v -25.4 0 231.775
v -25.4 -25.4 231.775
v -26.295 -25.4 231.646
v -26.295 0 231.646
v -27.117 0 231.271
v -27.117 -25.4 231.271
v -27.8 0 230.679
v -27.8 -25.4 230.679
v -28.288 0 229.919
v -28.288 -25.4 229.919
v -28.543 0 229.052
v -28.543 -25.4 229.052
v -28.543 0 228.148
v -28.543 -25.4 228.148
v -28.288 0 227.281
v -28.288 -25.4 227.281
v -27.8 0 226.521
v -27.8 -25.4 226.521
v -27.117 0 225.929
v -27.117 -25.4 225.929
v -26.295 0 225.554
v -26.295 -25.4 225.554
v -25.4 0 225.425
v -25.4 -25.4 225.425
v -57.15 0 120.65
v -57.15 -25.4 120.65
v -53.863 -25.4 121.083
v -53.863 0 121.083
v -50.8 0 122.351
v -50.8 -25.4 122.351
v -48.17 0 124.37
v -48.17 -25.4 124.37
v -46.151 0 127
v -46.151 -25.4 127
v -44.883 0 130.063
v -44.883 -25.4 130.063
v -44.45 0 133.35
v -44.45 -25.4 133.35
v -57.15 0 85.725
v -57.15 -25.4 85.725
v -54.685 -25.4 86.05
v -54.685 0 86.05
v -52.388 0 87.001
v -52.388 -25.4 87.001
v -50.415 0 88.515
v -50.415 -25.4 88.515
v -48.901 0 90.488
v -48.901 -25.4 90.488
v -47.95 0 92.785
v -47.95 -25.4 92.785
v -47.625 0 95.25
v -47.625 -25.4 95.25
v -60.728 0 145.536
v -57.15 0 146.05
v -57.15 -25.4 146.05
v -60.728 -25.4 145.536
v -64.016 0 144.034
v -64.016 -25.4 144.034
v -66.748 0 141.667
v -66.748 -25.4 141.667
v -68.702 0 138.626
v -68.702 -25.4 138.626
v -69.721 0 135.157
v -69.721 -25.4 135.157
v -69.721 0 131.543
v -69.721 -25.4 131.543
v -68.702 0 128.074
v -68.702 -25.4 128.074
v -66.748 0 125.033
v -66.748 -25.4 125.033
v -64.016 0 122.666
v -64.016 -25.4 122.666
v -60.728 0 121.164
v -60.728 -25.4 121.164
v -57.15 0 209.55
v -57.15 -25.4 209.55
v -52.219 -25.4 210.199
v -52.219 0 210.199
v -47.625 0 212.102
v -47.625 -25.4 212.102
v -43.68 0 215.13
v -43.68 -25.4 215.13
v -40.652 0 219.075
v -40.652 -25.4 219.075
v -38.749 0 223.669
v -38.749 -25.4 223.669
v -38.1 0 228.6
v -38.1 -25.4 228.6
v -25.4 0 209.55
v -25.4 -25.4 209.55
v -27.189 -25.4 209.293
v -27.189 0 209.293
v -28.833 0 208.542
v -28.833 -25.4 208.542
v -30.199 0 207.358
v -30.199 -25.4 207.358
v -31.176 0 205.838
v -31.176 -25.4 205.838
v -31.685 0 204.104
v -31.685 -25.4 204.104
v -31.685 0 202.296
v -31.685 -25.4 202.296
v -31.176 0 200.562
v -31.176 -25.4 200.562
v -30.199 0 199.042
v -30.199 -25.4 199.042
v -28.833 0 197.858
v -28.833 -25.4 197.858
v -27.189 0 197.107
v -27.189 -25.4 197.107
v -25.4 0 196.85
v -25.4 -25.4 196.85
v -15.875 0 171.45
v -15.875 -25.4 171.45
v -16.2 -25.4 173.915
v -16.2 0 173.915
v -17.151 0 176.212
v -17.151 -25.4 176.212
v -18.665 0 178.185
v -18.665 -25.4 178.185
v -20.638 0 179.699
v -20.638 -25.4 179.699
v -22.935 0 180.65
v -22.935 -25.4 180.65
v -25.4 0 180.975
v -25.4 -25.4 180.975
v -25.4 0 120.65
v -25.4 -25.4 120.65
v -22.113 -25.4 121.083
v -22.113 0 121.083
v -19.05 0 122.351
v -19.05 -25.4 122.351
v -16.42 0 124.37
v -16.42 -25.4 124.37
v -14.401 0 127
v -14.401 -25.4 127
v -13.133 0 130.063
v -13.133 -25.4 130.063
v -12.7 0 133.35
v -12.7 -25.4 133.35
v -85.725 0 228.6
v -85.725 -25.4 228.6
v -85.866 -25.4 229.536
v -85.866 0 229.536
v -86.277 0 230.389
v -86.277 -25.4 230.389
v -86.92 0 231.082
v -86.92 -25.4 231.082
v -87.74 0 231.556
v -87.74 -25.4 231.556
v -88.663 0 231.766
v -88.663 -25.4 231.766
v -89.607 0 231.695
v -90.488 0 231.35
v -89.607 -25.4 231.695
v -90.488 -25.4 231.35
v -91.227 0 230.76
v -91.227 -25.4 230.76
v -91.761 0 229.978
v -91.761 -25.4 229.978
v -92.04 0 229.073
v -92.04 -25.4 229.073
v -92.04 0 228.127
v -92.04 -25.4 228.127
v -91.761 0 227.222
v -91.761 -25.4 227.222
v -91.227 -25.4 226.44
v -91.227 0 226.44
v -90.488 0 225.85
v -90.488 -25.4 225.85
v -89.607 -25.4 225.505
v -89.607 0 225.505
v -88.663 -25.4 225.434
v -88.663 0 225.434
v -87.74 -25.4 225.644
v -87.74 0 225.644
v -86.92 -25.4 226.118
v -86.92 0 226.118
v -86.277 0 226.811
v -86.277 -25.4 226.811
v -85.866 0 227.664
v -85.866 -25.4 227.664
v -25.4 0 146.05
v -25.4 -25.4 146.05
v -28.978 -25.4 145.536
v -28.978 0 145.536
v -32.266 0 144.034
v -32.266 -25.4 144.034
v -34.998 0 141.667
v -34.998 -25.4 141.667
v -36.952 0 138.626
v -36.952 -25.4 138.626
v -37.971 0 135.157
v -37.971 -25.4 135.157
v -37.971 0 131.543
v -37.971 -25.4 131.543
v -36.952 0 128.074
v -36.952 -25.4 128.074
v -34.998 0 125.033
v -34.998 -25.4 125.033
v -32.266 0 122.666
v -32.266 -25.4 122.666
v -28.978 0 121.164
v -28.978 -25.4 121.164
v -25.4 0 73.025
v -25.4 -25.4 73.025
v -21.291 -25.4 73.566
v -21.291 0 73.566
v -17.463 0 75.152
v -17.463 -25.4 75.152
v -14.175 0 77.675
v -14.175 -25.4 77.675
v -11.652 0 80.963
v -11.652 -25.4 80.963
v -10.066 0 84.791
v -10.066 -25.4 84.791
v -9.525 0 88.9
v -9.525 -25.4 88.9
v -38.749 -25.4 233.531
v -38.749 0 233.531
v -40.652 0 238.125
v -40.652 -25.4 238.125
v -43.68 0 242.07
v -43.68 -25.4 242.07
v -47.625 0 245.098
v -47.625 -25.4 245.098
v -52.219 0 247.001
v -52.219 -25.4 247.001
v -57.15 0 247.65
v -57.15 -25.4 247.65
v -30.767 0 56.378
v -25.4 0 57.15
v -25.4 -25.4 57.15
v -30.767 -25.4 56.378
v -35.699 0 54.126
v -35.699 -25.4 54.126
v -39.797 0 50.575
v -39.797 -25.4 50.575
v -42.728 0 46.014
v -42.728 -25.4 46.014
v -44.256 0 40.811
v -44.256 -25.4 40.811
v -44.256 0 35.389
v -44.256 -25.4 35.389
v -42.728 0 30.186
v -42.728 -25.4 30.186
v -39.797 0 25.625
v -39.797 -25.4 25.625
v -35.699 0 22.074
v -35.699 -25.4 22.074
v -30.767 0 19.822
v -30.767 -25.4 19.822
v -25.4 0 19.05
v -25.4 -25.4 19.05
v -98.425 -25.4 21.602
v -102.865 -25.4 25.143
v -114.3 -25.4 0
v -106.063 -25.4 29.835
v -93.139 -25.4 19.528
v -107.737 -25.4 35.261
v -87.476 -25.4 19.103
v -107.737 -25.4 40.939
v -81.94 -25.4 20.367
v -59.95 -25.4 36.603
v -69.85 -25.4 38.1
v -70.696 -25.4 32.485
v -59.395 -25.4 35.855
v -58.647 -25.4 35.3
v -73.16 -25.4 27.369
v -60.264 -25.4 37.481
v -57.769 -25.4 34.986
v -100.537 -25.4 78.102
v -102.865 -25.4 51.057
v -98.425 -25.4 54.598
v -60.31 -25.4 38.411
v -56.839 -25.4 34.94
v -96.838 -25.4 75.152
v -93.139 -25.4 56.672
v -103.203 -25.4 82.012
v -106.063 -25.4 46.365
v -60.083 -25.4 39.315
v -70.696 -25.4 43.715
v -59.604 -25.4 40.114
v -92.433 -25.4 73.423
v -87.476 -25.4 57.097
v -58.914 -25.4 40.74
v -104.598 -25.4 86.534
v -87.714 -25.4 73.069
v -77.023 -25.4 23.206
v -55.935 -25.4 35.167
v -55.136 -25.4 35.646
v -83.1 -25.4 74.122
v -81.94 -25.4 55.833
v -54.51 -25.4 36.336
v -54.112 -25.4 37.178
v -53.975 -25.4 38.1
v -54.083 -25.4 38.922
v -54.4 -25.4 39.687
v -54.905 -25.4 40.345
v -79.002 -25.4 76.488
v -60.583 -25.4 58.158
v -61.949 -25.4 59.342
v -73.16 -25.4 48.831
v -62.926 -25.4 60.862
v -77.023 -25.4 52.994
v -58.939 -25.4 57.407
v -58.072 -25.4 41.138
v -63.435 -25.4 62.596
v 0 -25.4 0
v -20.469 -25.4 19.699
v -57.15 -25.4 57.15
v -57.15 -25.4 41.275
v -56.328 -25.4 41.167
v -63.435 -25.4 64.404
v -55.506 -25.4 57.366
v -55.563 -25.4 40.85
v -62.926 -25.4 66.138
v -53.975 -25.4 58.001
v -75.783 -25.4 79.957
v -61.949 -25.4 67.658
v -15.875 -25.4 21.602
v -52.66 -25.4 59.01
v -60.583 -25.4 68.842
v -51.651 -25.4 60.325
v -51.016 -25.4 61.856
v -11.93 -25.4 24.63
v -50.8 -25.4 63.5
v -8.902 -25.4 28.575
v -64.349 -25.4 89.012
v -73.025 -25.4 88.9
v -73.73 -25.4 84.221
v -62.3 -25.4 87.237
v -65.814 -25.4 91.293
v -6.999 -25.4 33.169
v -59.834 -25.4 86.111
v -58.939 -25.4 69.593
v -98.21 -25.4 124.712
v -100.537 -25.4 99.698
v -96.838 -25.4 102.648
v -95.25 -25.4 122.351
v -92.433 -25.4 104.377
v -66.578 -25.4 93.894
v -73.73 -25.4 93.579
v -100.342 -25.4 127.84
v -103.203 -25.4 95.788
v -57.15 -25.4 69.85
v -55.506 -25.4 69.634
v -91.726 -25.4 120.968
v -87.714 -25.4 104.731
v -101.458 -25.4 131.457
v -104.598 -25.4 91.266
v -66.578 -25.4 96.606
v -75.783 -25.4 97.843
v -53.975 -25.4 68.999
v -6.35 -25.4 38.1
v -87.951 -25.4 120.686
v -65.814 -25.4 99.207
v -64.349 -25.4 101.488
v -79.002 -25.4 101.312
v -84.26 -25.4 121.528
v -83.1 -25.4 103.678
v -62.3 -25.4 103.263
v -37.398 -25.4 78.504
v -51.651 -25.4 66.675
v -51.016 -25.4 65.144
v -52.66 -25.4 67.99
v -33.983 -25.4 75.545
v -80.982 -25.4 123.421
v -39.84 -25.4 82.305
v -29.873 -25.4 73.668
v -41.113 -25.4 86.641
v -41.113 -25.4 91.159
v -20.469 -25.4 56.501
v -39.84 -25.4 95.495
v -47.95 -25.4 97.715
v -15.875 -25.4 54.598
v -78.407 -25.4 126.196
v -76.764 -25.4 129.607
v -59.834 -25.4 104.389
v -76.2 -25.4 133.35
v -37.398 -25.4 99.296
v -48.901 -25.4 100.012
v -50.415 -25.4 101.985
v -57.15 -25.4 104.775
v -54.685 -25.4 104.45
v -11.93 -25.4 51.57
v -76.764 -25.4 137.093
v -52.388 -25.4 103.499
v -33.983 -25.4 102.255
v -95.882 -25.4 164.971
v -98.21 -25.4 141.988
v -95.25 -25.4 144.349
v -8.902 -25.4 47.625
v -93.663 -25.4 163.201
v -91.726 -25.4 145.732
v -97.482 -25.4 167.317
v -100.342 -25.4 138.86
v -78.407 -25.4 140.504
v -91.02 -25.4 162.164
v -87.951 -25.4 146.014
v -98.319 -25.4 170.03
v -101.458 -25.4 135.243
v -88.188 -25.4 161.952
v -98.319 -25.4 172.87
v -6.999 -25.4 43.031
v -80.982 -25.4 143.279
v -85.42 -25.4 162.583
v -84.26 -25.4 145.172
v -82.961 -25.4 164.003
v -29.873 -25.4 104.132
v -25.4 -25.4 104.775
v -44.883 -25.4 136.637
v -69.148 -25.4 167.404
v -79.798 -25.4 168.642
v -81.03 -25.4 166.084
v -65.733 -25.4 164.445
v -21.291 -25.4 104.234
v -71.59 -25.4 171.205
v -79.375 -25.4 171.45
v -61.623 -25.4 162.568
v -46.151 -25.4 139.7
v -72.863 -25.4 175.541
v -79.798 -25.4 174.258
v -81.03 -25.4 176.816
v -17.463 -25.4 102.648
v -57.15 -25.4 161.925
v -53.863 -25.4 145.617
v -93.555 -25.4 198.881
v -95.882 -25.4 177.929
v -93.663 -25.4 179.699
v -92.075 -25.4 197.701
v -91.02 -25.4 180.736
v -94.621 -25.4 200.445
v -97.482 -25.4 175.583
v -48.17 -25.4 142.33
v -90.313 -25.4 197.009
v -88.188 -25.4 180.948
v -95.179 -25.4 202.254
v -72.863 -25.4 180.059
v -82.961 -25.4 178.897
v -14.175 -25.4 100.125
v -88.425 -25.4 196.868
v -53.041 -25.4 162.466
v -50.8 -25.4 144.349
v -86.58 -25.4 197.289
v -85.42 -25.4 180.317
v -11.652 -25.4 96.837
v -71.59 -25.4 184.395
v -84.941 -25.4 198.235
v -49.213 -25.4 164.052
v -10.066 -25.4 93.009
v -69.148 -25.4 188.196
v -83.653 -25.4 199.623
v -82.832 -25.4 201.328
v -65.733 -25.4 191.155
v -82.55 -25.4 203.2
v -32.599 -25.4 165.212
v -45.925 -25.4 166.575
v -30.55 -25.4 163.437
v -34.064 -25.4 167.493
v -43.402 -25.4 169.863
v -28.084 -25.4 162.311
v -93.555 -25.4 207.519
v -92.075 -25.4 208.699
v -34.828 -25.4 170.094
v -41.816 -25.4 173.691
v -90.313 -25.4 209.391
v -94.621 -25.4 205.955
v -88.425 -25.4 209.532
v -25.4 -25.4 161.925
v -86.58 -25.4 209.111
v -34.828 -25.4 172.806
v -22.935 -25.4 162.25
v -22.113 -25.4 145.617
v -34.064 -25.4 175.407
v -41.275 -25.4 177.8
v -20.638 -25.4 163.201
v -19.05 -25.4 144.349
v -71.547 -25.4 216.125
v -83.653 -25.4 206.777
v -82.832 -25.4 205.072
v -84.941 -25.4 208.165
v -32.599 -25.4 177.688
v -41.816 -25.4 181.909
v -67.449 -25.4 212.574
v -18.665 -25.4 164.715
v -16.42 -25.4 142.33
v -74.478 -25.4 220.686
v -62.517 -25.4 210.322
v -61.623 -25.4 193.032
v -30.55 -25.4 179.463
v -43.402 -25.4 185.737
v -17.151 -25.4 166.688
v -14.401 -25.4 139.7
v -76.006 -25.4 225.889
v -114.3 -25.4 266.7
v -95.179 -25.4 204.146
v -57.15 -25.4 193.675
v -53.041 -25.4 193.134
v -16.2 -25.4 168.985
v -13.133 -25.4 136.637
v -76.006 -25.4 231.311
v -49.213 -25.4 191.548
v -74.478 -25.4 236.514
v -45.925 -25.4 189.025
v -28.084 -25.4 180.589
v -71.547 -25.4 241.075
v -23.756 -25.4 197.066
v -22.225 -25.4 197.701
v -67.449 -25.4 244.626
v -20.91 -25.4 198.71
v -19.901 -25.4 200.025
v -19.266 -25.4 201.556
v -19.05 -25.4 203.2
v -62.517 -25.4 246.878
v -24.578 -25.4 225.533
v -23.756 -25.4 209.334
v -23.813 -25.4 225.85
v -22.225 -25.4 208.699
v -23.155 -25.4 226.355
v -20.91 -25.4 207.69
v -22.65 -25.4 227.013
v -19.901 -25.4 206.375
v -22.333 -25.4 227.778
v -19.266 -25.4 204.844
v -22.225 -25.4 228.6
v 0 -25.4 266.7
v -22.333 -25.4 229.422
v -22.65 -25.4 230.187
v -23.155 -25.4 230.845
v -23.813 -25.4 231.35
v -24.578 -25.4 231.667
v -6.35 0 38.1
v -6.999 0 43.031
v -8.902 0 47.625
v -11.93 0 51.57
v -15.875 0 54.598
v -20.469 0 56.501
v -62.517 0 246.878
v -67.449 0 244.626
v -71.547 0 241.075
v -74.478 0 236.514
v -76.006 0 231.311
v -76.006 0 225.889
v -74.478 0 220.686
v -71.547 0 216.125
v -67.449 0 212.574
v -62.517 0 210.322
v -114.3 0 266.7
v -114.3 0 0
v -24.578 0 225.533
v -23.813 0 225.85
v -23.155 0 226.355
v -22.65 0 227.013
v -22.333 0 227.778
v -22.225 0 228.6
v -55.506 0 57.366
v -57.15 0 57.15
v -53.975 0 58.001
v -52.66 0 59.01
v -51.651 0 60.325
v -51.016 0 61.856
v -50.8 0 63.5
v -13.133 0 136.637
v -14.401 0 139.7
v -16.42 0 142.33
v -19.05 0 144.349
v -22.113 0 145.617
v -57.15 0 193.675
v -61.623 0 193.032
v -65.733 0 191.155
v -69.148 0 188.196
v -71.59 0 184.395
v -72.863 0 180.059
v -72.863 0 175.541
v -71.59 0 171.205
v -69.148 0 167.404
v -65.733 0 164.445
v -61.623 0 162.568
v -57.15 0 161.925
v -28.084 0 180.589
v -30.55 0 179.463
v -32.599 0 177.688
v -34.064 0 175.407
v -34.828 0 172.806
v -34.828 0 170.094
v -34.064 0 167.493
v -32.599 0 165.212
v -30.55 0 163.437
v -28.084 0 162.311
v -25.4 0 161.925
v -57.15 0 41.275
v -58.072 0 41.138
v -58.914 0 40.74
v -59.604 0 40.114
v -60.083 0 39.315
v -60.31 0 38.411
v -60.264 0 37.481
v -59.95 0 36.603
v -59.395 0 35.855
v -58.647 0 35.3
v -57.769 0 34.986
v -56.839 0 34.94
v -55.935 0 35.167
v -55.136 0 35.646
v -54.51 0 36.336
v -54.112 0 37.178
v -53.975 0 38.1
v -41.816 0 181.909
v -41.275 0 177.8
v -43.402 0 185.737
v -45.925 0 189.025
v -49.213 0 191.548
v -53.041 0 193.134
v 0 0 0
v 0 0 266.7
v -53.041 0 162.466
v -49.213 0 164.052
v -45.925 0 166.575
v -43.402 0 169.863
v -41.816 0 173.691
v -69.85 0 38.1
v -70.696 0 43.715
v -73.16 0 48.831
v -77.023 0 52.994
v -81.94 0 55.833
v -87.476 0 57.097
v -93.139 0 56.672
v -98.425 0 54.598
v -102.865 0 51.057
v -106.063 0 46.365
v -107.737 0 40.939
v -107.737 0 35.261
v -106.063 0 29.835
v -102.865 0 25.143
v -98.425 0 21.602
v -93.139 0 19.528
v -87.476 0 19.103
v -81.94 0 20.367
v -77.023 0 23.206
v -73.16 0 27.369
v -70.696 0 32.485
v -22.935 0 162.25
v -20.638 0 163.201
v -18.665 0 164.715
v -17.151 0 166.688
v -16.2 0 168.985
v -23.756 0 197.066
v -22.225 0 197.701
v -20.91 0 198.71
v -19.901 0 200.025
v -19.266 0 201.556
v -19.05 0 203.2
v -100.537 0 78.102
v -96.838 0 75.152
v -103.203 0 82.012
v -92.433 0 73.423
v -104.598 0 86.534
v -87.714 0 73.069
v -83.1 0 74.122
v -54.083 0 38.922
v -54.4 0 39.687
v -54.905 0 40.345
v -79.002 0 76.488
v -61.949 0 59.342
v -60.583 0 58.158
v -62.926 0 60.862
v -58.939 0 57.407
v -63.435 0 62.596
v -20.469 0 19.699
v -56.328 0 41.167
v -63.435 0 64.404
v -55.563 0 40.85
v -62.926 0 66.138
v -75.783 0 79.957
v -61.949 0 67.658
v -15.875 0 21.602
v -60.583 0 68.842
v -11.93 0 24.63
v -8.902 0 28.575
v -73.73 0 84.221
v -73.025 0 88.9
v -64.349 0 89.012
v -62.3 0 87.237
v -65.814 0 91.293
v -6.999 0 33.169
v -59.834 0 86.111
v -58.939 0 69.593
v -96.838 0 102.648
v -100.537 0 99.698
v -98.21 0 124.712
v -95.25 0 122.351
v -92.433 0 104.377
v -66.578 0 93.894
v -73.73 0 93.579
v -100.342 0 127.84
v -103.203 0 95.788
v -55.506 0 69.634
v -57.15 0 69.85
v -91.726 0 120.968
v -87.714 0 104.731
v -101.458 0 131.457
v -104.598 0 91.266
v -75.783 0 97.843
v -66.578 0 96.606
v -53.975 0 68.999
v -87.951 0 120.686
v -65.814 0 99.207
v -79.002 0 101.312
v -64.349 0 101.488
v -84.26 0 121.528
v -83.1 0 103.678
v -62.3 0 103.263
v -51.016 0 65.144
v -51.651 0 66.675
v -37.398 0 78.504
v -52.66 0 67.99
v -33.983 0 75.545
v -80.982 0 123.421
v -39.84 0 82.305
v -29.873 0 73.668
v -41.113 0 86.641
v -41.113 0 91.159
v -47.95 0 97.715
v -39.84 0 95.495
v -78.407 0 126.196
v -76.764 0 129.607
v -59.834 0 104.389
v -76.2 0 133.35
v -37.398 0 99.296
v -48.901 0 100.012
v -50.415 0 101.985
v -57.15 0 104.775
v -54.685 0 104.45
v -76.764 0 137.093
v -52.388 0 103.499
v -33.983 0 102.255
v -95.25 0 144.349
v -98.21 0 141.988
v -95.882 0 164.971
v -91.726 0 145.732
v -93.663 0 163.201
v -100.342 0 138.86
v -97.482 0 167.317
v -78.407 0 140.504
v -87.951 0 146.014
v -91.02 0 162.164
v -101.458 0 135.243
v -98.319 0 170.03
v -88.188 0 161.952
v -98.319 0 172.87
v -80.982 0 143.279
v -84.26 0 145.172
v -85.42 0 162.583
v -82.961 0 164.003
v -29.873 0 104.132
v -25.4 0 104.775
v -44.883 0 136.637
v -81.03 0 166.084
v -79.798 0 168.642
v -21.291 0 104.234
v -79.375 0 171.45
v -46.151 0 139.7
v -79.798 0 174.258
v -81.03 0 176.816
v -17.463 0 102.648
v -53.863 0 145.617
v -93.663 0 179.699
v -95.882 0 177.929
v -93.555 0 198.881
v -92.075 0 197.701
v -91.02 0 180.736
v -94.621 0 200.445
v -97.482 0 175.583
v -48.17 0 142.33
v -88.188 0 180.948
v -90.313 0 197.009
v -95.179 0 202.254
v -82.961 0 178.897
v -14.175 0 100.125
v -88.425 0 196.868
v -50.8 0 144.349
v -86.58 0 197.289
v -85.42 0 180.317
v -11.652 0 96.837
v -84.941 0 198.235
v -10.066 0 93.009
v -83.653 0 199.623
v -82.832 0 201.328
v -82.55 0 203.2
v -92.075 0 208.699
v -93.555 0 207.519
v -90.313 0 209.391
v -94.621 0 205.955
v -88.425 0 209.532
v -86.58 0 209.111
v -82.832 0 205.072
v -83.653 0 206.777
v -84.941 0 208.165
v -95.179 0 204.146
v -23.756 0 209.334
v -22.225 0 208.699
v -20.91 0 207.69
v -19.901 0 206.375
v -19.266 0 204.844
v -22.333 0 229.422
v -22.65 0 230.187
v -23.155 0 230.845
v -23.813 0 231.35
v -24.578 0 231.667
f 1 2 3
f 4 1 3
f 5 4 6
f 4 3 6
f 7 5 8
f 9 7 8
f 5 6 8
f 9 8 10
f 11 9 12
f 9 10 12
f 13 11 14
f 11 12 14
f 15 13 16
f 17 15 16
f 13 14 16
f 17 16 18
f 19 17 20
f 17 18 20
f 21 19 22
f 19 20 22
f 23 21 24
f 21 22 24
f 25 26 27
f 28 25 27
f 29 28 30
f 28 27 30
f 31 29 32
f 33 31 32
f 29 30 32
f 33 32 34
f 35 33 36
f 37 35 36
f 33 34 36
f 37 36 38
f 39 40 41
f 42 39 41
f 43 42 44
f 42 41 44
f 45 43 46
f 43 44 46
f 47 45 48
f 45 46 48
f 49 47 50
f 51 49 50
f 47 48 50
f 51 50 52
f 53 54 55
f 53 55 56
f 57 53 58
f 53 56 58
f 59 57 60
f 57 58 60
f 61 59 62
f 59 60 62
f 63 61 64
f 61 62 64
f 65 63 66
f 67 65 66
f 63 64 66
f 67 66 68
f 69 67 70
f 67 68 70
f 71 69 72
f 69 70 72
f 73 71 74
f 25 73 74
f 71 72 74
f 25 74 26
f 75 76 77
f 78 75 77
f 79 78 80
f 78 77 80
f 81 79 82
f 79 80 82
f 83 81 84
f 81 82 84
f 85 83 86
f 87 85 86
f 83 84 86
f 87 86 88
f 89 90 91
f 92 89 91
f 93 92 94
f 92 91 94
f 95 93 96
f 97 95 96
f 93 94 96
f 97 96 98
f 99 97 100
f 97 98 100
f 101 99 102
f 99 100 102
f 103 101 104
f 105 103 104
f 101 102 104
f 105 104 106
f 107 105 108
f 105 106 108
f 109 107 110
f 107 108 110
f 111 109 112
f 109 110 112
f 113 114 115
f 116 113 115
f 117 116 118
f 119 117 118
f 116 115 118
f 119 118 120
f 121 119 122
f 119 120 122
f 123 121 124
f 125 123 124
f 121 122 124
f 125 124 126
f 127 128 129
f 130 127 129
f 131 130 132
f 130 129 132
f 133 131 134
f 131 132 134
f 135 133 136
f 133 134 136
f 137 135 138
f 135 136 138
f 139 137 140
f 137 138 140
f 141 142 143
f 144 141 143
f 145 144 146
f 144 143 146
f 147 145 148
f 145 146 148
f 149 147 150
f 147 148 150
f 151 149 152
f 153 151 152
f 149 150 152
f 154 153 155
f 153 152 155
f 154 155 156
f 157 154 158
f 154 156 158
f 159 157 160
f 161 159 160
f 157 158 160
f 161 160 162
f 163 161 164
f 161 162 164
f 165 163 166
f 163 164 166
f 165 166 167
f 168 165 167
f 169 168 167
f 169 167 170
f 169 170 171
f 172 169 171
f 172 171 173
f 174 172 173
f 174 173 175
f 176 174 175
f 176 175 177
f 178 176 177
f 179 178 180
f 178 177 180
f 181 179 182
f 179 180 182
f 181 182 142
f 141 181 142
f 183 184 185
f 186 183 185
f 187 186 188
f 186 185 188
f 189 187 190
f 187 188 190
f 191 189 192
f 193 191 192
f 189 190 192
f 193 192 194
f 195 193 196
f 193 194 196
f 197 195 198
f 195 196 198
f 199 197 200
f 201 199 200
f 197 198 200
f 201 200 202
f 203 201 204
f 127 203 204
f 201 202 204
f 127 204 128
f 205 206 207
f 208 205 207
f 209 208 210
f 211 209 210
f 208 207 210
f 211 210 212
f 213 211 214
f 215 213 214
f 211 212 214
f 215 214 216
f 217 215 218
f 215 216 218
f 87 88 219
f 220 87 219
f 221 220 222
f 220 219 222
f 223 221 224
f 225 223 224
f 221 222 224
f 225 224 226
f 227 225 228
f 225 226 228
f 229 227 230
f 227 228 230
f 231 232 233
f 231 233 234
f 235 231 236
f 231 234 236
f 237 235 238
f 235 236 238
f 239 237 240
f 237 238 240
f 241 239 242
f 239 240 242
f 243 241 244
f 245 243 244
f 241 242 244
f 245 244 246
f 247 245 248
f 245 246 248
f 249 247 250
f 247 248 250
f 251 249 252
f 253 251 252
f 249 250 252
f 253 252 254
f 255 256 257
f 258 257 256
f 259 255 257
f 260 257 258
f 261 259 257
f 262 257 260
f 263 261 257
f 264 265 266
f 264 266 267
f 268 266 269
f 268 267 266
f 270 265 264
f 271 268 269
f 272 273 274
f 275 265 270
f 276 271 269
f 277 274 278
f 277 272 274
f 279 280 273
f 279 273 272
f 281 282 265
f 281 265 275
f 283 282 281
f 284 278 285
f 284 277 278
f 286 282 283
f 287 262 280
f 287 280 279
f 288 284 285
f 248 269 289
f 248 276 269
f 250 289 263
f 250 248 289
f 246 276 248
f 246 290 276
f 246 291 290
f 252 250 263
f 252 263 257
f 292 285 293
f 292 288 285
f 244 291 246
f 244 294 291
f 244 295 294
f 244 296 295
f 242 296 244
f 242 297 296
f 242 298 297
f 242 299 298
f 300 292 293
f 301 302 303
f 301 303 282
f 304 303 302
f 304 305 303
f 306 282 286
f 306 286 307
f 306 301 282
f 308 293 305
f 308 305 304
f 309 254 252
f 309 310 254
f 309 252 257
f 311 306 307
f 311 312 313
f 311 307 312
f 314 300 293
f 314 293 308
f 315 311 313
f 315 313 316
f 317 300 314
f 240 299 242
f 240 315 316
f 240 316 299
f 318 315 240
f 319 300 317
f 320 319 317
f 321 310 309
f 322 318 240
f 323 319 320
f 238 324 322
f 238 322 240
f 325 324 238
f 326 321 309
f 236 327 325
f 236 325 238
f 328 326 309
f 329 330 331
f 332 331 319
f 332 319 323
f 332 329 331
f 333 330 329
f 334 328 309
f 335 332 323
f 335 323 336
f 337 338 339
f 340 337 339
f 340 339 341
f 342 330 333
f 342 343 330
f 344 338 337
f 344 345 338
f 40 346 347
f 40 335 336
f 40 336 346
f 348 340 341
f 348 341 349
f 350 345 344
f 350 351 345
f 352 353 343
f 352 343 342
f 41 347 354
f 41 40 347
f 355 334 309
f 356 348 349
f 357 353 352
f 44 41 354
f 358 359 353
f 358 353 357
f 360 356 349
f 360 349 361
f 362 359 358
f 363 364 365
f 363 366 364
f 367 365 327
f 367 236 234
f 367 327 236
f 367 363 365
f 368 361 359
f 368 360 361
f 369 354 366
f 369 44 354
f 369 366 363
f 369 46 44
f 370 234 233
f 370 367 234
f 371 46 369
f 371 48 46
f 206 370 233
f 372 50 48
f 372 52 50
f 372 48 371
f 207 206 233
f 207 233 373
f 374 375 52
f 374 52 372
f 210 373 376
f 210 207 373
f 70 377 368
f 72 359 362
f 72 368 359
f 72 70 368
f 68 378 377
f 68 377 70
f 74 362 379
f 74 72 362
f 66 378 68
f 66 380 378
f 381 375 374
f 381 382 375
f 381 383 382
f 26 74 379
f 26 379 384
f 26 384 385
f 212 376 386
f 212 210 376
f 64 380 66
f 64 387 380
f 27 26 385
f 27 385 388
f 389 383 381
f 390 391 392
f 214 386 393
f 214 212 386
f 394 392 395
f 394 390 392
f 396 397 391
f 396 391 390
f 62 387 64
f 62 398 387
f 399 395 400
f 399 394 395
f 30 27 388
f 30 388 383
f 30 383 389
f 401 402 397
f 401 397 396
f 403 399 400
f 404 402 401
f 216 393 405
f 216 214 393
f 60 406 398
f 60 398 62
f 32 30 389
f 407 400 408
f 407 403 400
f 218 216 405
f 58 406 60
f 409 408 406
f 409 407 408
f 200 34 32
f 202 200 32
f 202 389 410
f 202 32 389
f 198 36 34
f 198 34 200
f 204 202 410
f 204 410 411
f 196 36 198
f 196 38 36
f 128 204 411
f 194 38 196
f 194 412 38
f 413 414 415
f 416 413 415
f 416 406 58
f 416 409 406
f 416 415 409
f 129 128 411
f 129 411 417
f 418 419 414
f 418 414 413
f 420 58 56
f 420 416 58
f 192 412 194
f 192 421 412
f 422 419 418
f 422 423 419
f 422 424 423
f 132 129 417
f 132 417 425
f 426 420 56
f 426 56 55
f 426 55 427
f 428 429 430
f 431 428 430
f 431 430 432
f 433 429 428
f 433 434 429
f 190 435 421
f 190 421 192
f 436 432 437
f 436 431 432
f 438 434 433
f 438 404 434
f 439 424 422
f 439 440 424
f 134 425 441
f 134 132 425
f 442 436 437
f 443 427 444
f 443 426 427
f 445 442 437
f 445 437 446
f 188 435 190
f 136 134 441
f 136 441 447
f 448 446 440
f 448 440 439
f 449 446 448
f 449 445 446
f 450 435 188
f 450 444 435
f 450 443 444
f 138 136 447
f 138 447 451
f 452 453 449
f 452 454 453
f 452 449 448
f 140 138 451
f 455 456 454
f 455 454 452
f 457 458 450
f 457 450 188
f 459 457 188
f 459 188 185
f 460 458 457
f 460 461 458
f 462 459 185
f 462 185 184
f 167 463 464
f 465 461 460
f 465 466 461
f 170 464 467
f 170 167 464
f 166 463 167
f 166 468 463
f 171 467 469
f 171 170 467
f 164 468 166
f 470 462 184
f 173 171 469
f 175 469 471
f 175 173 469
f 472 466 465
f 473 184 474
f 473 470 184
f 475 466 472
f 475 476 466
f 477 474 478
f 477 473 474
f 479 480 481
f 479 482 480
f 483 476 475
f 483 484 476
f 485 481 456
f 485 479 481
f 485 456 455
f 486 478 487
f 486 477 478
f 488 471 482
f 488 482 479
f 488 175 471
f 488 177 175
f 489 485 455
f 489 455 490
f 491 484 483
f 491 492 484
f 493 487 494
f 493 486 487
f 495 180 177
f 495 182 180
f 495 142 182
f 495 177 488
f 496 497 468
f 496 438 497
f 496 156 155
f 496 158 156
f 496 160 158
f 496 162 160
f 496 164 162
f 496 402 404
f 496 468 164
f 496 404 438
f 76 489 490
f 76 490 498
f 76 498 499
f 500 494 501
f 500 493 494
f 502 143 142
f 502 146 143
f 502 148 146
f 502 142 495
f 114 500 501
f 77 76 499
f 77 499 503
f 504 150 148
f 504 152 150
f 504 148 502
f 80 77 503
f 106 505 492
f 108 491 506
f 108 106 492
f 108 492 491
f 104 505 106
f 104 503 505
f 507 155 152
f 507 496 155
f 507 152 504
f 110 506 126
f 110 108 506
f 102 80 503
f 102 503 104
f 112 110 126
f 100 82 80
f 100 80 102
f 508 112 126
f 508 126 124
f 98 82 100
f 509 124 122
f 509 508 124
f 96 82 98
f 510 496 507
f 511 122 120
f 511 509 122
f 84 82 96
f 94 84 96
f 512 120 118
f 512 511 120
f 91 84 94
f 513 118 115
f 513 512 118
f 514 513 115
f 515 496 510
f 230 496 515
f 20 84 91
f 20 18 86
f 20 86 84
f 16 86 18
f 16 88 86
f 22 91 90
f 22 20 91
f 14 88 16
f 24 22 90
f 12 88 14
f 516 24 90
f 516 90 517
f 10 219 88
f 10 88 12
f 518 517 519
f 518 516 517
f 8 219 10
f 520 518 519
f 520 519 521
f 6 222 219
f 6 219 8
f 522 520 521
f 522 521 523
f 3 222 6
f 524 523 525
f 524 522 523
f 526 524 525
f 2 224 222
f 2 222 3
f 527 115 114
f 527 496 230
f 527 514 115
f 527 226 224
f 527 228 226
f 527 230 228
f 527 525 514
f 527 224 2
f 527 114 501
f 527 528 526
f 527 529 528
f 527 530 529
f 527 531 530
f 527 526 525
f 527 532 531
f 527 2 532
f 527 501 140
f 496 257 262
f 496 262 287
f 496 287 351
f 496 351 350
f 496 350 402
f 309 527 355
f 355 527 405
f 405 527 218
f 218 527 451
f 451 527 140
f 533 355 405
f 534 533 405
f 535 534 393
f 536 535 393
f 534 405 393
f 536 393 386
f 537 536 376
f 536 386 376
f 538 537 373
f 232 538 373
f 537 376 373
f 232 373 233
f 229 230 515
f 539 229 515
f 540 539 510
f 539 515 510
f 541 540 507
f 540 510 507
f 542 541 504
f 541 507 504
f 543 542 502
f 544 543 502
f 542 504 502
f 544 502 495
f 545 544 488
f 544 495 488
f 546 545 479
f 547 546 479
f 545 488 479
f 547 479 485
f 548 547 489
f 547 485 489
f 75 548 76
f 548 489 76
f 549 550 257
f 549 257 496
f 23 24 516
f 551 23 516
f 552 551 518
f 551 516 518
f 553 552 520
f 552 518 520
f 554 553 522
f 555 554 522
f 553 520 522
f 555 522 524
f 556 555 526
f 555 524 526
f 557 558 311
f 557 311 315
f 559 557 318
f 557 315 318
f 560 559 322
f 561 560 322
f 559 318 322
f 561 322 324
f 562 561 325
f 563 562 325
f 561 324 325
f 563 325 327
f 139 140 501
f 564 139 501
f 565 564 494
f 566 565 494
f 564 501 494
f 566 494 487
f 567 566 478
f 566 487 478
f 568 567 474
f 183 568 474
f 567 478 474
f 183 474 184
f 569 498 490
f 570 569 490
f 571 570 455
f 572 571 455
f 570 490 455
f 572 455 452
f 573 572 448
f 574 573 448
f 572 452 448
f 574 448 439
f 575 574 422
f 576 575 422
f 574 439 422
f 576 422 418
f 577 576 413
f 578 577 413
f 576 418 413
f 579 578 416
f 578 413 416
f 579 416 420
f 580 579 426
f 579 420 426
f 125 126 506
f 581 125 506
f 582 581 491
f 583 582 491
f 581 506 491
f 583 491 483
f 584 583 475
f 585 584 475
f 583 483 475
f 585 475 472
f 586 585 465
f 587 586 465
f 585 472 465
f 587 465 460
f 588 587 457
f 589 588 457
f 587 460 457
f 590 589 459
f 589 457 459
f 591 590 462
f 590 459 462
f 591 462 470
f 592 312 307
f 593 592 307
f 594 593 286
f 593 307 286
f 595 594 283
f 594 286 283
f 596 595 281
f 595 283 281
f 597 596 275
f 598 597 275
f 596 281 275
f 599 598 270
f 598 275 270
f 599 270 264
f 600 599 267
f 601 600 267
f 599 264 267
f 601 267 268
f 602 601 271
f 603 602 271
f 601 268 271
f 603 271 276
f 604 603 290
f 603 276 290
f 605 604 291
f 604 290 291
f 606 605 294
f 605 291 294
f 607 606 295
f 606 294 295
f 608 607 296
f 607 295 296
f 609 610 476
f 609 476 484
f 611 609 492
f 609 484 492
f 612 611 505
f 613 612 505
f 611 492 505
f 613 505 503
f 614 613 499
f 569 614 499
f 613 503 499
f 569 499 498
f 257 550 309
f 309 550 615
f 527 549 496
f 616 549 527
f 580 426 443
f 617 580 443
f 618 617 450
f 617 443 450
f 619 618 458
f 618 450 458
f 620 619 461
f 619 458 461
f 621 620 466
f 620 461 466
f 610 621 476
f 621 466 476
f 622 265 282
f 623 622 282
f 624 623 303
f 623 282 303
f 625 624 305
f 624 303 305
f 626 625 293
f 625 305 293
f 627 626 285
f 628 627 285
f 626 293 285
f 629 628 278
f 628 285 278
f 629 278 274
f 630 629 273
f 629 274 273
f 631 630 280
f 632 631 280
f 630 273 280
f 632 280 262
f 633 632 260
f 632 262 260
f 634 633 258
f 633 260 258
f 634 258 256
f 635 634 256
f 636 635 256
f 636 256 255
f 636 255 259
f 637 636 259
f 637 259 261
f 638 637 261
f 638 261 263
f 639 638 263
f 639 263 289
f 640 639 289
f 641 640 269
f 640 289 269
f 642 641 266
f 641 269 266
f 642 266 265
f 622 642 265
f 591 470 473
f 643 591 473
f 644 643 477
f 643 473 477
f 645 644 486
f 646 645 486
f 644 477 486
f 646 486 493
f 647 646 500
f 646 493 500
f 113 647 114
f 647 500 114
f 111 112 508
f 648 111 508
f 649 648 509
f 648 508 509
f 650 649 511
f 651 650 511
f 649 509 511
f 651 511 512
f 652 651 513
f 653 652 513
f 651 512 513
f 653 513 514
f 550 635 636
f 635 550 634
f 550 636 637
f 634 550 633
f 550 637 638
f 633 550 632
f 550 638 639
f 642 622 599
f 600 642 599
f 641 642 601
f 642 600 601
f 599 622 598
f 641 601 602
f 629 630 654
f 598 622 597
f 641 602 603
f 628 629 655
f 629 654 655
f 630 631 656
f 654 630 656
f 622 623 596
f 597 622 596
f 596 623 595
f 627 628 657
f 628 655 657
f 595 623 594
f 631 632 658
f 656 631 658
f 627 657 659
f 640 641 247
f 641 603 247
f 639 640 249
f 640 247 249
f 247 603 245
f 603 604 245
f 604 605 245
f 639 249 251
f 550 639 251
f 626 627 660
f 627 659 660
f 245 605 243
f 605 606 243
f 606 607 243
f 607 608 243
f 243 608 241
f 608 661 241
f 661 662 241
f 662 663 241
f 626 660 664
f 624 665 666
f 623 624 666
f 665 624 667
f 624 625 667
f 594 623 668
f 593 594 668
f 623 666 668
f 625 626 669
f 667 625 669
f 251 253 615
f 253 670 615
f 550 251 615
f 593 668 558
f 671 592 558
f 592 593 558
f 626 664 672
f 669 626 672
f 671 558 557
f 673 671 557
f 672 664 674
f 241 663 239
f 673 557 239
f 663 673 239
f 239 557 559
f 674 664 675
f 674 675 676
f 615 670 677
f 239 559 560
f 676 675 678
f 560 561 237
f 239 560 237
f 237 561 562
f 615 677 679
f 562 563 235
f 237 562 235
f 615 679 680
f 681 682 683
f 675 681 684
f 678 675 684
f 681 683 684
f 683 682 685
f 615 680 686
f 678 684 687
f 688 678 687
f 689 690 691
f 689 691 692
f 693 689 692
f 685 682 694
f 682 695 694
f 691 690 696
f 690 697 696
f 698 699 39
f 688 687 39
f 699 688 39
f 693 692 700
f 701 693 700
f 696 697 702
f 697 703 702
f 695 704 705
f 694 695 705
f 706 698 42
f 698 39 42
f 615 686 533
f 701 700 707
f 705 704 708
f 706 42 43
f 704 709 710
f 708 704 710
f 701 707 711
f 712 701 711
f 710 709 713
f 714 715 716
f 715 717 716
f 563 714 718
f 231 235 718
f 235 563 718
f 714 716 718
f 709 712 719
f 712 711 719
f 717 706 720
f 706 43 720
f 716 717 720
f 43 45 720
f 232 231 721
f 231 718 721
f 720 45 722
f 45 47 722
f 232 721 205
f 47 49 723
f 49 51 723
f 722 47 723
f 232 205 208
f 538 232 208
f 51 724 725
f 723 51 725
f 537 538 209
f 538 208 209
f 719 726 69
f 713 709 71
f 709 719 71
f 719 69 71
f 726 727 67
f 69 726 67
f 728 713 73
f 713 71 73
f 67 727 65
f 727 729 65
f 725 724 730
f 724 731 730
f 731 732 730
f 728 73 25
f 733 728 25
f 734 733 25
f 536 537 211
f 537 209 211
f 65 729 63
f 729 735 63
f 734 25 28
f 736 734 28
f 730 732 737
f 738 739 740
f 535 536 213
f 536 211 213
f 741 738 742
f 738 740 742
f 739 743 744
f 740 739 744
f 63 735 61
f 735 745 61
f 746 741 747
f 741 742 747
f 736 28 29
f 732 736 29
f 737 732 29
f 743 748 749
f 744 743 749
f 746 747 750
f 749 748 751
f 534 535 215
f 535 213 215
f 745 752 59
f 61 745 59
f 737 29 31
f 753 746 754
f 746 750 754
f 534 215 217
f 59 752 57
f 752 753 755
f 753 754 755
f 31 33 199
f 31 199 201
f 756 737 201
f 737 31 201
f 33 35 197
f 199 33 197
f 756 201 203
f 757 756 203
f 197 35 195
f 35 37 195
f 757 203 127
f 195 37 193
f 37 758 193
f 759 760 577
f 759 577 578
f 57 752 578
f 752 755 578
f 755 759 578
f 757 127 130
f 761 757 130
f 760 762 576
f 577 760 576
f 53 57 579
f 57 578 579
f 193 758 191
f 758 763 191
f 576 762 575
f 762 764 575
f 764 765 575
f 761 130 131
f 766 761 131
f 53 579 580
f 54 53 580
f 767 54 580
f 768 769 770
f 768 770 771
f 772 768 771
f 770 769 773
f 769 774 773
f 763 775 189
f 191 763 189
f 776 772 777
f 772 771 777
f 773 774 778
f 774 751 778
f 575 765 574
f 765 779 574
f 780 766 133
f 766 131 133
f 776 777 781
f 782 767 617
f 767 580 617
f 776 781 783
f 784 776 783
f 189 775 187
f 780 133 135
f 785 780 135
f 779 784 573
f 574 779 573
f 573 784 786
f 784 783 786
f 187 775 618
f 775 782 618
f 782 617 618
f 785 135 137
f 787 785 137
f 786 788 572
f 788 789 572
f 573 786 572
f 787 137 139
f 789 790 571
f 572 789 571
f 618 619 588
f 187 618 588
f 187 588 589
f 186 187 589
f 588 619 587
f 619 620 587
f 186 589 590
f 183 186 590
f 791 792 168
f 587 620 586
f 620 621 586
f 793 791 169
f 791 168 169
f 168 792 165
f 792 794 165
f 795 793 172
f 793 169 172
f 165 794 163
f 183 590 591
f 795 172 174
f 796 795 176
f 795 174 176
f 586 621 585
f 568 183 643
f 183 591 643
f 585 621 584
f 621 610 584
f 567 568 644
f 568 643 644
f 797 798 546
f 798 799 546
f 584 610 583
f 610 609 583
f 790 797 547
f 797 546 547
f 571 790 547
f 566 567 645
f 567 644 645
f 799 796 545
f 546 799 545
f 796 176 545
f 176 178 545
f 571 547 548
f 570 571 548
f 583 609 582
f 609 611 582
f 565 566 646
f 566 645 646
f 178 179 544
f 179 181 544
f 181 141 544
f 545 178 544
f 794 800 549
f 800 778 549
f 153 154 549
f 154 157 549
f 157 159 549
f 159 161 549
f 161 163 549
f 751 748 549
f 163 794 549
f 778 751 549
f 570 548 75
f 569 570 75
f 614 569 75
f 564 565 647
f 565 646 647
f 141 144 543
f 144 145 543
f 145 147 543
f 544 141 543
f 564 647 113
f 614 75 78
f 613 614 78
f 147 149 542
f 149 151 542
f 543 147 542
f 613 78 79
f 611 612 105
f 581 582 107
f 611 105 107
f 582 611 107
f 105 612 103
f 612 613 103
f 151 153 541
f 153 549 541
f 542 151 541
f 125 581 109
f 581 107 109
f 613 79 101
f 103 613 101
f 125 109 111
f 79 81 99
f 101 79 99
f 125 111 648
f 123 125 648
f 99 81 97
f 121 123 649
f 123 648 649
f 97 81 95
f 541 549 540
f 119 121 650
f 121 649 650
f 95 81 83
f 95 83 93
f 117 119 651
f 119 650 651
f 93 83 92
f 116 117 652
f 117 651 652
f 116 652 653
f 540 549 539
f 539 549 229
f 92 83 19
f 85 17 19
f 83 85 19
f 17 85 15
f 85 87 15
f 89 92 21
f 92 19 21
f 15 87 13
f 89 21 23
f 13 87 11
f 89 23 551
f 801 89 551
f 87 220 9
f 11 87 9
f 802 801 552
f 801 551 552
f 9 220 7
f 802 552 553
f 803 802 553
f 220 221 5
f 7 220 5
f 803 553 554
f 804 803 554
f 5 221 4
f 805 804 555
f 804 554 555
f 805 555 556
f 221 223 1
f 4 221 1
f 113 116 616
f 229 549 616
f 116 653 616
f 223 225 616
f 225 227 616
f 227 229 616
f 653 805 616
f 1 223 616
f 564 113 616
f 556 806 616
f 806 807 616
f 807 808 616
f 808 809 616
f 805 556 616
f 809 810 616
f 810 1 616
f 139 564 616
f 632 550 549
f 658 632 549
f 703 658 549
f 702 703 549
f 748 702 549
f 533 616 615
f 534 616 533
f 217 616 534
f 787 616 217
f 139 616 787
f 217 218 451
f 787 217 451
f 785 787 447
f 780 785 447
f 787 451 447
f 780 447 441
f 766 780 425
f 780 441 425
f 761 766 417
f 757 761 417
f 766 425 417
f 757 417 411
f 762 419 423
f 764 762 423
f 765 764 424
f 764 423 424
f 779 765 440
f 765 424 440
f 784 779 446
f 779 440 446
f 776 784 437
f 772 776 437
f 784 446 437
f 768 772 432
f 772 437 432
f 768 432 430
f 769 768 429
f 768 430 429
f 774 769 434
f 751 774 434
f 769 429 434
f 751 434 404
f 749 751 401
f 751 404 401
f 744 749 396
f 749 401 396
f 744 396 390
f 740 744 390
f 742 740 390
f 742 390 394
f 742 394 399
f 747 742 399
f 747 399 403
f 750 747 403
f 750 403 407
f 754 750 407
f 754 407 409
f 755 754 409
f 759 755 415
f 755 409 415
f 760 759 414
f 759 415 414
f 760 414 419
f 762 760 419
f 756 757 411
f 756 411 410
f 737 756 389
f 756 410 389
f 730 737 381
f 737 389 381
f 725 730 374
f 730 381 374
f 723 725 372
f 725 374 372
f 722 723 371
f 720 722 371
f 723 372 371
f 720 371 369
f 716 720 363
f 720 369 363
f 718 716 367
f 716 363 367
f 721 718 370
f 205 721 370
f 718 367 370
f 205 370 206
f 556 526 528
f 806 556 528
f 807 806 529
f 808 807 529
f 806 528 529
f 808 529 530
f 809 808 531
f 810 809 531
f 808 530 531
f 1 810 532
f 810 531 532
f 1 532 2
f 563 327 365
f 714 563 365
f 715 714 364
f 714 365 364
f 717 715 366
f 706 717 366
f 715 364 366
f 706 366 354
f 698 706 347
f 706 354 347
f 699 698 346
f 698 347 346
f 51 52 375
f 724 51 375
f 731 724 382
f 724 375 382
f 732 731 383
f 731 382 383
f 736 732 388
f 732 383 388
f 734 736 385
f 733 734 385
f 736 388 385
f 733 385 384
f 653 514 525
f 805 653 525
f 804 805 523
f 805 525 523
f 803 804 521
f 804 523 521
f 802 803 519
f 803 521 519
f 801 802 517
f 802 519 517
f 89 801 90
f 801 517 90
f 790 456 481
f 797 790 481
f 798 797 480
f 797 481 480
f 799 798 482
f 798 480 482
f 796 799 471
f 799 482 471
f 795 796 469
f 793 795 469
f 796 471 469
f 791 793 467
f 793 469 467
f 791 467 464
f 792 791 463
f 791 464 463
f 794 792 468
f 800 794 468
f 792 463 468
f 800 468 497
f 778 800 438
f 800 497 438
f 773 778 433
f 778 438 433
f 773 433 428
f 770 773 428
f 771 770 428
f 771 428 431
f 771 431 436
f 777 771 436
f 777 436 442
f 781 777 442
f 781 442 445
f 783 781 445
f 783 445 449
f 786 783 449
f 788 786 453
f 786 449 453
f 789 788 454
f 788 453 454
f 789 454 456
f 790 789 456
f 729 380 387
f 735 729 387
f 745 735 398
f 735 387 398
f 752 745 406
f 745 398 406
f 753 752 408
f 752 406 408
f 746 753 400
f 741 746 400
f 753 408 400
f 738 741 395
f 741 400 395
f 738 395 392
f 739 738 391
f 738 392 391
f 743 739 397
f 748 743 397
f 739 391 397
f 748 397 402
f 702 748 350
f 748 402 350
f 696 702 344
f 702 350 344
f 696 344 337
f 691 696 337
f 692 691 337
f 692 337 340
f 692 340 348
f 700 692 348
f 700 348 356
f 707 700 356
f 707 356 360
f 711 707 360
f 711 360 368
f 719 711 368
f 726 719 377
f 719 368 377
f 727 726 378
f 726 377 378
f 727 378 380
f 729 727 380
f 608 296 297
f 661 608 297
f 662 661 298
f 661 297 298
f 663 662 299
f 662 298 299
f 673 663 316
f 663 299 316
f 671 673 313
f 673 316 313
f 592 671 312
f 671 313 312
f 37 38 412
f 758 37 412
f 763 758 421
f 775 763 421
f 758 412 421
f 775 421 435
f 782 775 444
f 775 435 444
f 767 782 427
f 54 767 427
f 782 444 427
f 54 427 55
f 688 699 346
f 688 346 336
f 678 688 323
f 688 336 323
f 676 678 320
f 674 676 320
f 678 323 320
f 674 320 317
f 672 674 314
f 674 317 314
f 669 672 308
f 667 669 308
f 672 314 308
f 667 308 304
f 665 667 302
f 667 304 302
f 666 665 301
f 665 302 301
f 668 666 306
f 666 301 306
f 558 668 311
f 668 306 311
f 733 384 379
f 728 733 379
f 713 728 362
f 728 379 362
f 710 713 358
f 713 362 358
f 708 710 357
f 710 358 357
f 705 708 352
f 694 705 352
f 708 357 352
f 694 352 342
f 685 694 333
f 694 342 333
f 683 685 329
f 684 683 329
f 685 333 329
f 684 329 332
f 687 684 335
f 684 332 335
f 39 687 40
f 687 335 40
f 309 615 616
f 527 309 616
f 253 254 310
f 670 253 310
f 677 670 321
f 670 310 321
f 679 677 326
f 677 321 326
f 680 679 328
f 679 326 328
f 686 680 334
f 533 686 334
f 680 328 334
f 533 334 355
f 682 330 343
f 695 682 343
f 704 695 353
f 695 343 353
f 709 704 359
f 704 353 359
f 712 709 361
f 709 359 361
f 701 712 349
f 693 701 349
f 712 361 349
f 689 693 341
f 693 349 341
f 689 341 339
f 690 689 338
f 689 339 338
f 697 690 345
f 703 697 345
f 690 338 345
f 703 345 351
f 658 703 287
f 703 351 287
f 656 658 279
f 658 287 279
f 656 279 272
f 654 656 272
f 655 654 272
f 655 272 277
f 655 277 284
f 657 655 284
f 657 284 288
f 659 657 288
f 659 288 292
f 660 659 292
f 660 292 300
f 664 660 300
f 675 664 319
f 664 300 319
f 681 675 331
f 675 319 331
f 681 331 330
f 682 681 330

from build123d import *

# Parameters (mm, degrees)
F0_W     = 114.3
F0_H     = 266.7
F1_DEPTH = 25.4
F2_R     = 3.175
F2_R_2   = 6.35
F2_R_3   = 9.525
F2_R_4   = 12.7
F2_R_5   = 15.875
F2_R_6   = 19.05
F3_DEPTH = 25.4
F5_DEPTH = 25.4


with BuildPart() as f1:
    # F0 (on Front) → F1 (new body)
    with BuildSketch(Plane.XZ):
        with Locations((-57.15, 133.35)):
            Rectangle(F0_W, F0_H)
    extrude(amount=F1_DEPTH)

    # F2 (on face) → F3 (cut)
    with BuildSketch(Plane.XZ.offset(25.4)):
        with BuildLine():
            ThreePointArc((-25.4, 57.15), (-44.45, 38.1), (-25.4, 19.05))
            Line((-25.4, 19.05), (-25.4, 38.1))
            Line((-25.4, 38.1), (-25.4, 57.15))
        make_face()
        with BuildLine():
            ThreePointArc((-25.4, 231.775), (-28.575, 228.6), (-25.4, 225.425))
            Line((-25.4, 225.425), (-25.4, 228.6))
            Line((-25.4, 228.6), (-25.4, 231.775))
        make_face()
        with BuildLine():
            Line((-25.4, 228.6), (-25.4, 225.425))
            ThreePointArc((-25.4, 225.425), (-23.154936, 226.354936), (-22.225, 228.6))
            ThreePointArc((-22.225, 228.6), (-23.154936, 230.845064), (-25.4, 231.775))
            Line((-25.4, 231.775), (-25.4, 228.6))
        make_face()
        with BuildLine():
            ThreePointArc((-25.4, 209.55), (-31.75, 203.2), (-25.4, 196.85))
            Line((-25.4, 196.85), (-25.4, 203.2))
            Line((-25.4, 203.2), (-25.4, 209.55))
        make_face()
        with BuildLine():
            Line((-25.4, 203.2), (-25.4, 196.85))
            ThreePointArc((-25.4, 196.85), (-20.909872, 198.709872), (-19.05, 203.2))
            ThreePointArc((-19.05, 203.2), (-20.909872, 207.690128), (-25.4, 209.55))
            Line((-25.4, 209.55), (-25.4, 203.2))
        make_face()
        with BuildLine():
            ThreePointArc((-25.4, 180.975), (-34.925, 171.45), (-25.4, 161.925))
            Line((-25.4, 161.925), (-25.4, 171.45))
            Line((-25.4, 171.45), (-25.4, 180.975))
        make_face()
        with BuildLine():
            Line((-25.4, 171.45), (-25.4, 161.925))
            ThreePointArc((-25.4, 161.925), (-18.664808, 164.714808), (-15.875, 171.45))
            ThreePointArc((-15.875, 171.45), (-18.664808, 178.185192), (-25.4, 180.975))
            Line((-25.4, 180.975), (-25.4, 171.45))
        make_face()
        with BuildLine():
            ThreePointArc((-25.4, 146.05), (-38.1, 133.35), (-25.4, 120.65))
            Line((-25.4, 120.65), (-25.4, 133.35))
            Line((-25.4, 133.35), (-25.4, 146.05))
        make_face()
        with BuildLine():
            Line((-25.4, 133.35), (-25.4, 120.65))
            ThreePointArc((-25.4, 120.65), (-16.419744, 124.369744), (-12.7, 133.35))
            ThreePointArc((-12.7, 133.35), (-16.419744, 142.330256), (-25.4, 146.05))
            Line((-25.4, 146.05), (-25.4, 133.35))
        make_face()
        with BuildLine():
            ThreePointArc((-25.4, 104.775), (-41.275, 88.9), (-25.4, 73.025))
            Line((-25.4, 73.025), (-25.4, 88.9))
            Line((-25.4, 88.9), (-25.4, 104.775))
        make_face()
        with BuildLine():
            Line((-25.4, 88.9), (-25.4, 73.025))
            ThreePointArc((-25.4, 73.025), (-14.17468, 77.67468), (-9.525, 88.9))
            ThreePointArc((-9.525, 88.9), (-14.17468, 100.12532), (-25.4, 104.775))
            Line((-25.4, 104.775), (-25.4, 88.9))
        make_face()
        with BuildLine():
            Line((-25.4, 38.1), (-25.4, 19.05))
            ThreePointArc((-25.4, 19.05), (-11.929616, 24.629616), (-6.35, 38.1))
            ThreePointArc((-6.35, 38.1), (-11.929616, 51.570384), (-25.4, 57.15))
            Line((-25.4, 57.15), (-25.4, 38.1))
        make_face()
        with Locations((-88.9, 228.6)):
            Circle(F2_R)
        with Locations((-88.9, 203.2)):
            Circle(F2_R_2)
        with Locations((-88.9, 171.45)):
            Circle(F2_R_3)
        with Locations((-88.9, 133.35)):
            Circle(F2_R_4)
        with Locations((-88.9, 88.9)):
            Circle(F2_R_5)
        with Locations((-88.9, 38.1)):
            Circle(F2_R_6)
    extrude(amount=-F3_DEPTH, mode=Mode.SUBTRACT)

    # F4 (on face) → F5 (cut)
    with BuildSketch(Plane.XZ.offset(25.4)):
        with BuildLine():
            ThreePointArc((-57.15, 247.65), (-76.2, 228.6), (-57.15, 209.55))
            Line((-57.15, 209.55), (-57.15, 228.6))
            Line((-57.15, 228.6), (-57.15, 247.65))
        make_face()
        with BuildLine():
            Line((-57.15, 228.6), (-57.15, 209.55))
            ThreePointArc((-57.15, 209.55), (-43.679616, 215.129616), (-38.1, 228.6))
            ThreePointArc((-38.1, 228.6), (-43.679616, 242.070384), (-57.15, 247.65))
            Line((-57.15, 247.65), (-57.15, 228.6))
        make_face()
        with BuildLine():
            ThreePointArc((-57.15, 193.675), (-73.025, 177.8), (-57.15, 161.925))
            Line((-57.15, 161.925), (-57.15, 177.8))
            Line((-57.15, 177.8), (-57.15, 193.675))
        make_face()
        with BuildLine():
            Line((-57.15, 177.8), (-57.15, 161.925))
            ThreePointArc((-57.15, 161.925), (-45.92468, 166.57468), (-41.275, 177.8))
            ThreePointArc((-41.275, 177.8), (-45.92468, 189.02532), (-57.15, 193.675))
            Line((-57.15, 193.675), (-57.15, 177.8))
        make_face()
        with BuildLine():
            ThreePointArc((-57.15, 146.05), (-69.85, 133.35), (-57.15, 120.65))
            Line((-57.15, 120.65), (-57.15, 133.35))
            Line((-57.15, 133.35), (-57.15, 146.05))
        make_face()
        with BuildLine():
            Line((-57.15, 133.35), (-57.15, 120.65))
            ThreePointArc((-57.15, 120.65), (-48.169744, 124.369744), (-44.45, 133.35))
            ThreePointArc((-44.45, 133.35), (-48.169744, 142.330256), (-57.15, 146.05))
            Line((-57.15, 146.05), (-57.15, 133.35))
        make_face()
        with BuildLine():
            ThreePointArc((-57.15, 104.775), (-66.675, 95.25), (-57.15, 85.725))
            Line((-57.15, 85.725), (-57.15, 95.25))
            Line((-57.15, 95.25), (-57.15, 104.775))
        make_face()
        with BuildLine():
            Line((-57.15, 95.25), (-57.15, 85.725))
            ThreePointArc((-57.15, 85.725), (-50.414808, 88.514808), (-47.625, 95.25))
            ThreePointArc((-47.625, 95.25), (-50.414808, 101.985192), (-57.15, 104.775))
            Line((-57.15, 104.775), (-57.15, 95.25))
        make_face()
        with BuildLine():
            ThreePointArc((-57.15, 69.85), (-63.5, 63.5), (-57.15, 57.15))
            Line((-57.15, 57.15), (-57.15, 63.5))
            Line((-57.15, 63.5), (-57.15, 69.85))
        make_face()
        with BuildLine():
            Line((-57.15, 63.5), (-57.15, 57.15))
            ThreePointArc((-57.15, 57.15), (-52.659872, 59.009872), (-50.8, 63.5))
            ThreePointArc((-50.8, 63.5), (-52.659872, 67.990128), (-57.15, 69.85))
            Line((-57.15, 69.85), (-57.15, 63.5))
        make_face()
        with BuildLine():
            ThreePointArc((-53.975, 38.1), (-54.904936, 40.345064), (-57.15, 41.275))
            ThreePointArc((-57.15, 41.275), (-59.395064, 35.854936), (-53.975, 38.1))
        make_face()
    extrude(amount=-F5_DEPTH, mode=Mode.SUBTRACT)


solid = f1.part
